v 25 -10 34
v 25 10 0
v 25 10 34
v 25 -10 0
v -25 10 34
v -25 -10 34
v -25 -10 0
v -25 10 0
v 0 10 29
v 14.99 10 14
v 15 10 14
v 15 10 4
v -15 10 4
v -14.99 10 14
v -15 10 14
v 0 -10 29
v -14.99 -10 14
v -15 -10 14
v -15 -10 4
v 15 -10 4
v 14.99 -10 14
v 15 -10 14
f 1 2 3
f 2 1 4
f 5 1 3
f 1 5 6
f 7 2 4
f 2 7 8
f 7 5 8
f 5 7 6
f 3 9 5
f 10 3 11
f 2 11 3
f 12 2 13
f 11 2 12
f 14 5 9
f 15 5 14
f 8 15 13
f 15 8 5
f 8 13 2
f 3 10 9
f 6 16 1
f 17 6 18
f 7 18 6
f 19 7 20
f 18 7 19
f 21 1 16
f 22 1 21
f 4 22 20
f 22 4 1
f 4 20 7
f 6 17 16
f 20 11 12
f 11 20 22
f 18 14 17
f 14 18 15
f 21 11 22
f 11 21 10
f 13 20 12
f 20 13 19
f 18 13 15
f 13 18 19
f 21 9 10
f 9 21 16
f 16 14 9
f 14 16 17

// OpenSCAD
// Tunnel block: the 30 x 10 mm clearance envelope with a 45-degree pointed
// roof above it instead of a flat 30 mm bridge.
$fn = 96;
tunnel_width = 30; tunnel_height = 10; floor_thickness = 4;
difference() {
    translate([-25, -10, 0]) cube([50, 20, 34]);
    translate([-tunnel_width / 2, -11, floor_thickness]) cube([tunnel_width, 22, tunnel_height]);
    // roof prism in XZ, extruded along Y
    translate([0, 11, 0]) rotate([90, 0, 0]) linear_extrude(22)
        polygon([[-tunnel_width / 2, floor_thickness + tunnel_height - 0.01],
                 [tunnel_width / 2, floor_thickness + tunnel_height - 0.01],
                 [0, floor_thickness + tunnel_height + tunnel_width / 2]]);
}
